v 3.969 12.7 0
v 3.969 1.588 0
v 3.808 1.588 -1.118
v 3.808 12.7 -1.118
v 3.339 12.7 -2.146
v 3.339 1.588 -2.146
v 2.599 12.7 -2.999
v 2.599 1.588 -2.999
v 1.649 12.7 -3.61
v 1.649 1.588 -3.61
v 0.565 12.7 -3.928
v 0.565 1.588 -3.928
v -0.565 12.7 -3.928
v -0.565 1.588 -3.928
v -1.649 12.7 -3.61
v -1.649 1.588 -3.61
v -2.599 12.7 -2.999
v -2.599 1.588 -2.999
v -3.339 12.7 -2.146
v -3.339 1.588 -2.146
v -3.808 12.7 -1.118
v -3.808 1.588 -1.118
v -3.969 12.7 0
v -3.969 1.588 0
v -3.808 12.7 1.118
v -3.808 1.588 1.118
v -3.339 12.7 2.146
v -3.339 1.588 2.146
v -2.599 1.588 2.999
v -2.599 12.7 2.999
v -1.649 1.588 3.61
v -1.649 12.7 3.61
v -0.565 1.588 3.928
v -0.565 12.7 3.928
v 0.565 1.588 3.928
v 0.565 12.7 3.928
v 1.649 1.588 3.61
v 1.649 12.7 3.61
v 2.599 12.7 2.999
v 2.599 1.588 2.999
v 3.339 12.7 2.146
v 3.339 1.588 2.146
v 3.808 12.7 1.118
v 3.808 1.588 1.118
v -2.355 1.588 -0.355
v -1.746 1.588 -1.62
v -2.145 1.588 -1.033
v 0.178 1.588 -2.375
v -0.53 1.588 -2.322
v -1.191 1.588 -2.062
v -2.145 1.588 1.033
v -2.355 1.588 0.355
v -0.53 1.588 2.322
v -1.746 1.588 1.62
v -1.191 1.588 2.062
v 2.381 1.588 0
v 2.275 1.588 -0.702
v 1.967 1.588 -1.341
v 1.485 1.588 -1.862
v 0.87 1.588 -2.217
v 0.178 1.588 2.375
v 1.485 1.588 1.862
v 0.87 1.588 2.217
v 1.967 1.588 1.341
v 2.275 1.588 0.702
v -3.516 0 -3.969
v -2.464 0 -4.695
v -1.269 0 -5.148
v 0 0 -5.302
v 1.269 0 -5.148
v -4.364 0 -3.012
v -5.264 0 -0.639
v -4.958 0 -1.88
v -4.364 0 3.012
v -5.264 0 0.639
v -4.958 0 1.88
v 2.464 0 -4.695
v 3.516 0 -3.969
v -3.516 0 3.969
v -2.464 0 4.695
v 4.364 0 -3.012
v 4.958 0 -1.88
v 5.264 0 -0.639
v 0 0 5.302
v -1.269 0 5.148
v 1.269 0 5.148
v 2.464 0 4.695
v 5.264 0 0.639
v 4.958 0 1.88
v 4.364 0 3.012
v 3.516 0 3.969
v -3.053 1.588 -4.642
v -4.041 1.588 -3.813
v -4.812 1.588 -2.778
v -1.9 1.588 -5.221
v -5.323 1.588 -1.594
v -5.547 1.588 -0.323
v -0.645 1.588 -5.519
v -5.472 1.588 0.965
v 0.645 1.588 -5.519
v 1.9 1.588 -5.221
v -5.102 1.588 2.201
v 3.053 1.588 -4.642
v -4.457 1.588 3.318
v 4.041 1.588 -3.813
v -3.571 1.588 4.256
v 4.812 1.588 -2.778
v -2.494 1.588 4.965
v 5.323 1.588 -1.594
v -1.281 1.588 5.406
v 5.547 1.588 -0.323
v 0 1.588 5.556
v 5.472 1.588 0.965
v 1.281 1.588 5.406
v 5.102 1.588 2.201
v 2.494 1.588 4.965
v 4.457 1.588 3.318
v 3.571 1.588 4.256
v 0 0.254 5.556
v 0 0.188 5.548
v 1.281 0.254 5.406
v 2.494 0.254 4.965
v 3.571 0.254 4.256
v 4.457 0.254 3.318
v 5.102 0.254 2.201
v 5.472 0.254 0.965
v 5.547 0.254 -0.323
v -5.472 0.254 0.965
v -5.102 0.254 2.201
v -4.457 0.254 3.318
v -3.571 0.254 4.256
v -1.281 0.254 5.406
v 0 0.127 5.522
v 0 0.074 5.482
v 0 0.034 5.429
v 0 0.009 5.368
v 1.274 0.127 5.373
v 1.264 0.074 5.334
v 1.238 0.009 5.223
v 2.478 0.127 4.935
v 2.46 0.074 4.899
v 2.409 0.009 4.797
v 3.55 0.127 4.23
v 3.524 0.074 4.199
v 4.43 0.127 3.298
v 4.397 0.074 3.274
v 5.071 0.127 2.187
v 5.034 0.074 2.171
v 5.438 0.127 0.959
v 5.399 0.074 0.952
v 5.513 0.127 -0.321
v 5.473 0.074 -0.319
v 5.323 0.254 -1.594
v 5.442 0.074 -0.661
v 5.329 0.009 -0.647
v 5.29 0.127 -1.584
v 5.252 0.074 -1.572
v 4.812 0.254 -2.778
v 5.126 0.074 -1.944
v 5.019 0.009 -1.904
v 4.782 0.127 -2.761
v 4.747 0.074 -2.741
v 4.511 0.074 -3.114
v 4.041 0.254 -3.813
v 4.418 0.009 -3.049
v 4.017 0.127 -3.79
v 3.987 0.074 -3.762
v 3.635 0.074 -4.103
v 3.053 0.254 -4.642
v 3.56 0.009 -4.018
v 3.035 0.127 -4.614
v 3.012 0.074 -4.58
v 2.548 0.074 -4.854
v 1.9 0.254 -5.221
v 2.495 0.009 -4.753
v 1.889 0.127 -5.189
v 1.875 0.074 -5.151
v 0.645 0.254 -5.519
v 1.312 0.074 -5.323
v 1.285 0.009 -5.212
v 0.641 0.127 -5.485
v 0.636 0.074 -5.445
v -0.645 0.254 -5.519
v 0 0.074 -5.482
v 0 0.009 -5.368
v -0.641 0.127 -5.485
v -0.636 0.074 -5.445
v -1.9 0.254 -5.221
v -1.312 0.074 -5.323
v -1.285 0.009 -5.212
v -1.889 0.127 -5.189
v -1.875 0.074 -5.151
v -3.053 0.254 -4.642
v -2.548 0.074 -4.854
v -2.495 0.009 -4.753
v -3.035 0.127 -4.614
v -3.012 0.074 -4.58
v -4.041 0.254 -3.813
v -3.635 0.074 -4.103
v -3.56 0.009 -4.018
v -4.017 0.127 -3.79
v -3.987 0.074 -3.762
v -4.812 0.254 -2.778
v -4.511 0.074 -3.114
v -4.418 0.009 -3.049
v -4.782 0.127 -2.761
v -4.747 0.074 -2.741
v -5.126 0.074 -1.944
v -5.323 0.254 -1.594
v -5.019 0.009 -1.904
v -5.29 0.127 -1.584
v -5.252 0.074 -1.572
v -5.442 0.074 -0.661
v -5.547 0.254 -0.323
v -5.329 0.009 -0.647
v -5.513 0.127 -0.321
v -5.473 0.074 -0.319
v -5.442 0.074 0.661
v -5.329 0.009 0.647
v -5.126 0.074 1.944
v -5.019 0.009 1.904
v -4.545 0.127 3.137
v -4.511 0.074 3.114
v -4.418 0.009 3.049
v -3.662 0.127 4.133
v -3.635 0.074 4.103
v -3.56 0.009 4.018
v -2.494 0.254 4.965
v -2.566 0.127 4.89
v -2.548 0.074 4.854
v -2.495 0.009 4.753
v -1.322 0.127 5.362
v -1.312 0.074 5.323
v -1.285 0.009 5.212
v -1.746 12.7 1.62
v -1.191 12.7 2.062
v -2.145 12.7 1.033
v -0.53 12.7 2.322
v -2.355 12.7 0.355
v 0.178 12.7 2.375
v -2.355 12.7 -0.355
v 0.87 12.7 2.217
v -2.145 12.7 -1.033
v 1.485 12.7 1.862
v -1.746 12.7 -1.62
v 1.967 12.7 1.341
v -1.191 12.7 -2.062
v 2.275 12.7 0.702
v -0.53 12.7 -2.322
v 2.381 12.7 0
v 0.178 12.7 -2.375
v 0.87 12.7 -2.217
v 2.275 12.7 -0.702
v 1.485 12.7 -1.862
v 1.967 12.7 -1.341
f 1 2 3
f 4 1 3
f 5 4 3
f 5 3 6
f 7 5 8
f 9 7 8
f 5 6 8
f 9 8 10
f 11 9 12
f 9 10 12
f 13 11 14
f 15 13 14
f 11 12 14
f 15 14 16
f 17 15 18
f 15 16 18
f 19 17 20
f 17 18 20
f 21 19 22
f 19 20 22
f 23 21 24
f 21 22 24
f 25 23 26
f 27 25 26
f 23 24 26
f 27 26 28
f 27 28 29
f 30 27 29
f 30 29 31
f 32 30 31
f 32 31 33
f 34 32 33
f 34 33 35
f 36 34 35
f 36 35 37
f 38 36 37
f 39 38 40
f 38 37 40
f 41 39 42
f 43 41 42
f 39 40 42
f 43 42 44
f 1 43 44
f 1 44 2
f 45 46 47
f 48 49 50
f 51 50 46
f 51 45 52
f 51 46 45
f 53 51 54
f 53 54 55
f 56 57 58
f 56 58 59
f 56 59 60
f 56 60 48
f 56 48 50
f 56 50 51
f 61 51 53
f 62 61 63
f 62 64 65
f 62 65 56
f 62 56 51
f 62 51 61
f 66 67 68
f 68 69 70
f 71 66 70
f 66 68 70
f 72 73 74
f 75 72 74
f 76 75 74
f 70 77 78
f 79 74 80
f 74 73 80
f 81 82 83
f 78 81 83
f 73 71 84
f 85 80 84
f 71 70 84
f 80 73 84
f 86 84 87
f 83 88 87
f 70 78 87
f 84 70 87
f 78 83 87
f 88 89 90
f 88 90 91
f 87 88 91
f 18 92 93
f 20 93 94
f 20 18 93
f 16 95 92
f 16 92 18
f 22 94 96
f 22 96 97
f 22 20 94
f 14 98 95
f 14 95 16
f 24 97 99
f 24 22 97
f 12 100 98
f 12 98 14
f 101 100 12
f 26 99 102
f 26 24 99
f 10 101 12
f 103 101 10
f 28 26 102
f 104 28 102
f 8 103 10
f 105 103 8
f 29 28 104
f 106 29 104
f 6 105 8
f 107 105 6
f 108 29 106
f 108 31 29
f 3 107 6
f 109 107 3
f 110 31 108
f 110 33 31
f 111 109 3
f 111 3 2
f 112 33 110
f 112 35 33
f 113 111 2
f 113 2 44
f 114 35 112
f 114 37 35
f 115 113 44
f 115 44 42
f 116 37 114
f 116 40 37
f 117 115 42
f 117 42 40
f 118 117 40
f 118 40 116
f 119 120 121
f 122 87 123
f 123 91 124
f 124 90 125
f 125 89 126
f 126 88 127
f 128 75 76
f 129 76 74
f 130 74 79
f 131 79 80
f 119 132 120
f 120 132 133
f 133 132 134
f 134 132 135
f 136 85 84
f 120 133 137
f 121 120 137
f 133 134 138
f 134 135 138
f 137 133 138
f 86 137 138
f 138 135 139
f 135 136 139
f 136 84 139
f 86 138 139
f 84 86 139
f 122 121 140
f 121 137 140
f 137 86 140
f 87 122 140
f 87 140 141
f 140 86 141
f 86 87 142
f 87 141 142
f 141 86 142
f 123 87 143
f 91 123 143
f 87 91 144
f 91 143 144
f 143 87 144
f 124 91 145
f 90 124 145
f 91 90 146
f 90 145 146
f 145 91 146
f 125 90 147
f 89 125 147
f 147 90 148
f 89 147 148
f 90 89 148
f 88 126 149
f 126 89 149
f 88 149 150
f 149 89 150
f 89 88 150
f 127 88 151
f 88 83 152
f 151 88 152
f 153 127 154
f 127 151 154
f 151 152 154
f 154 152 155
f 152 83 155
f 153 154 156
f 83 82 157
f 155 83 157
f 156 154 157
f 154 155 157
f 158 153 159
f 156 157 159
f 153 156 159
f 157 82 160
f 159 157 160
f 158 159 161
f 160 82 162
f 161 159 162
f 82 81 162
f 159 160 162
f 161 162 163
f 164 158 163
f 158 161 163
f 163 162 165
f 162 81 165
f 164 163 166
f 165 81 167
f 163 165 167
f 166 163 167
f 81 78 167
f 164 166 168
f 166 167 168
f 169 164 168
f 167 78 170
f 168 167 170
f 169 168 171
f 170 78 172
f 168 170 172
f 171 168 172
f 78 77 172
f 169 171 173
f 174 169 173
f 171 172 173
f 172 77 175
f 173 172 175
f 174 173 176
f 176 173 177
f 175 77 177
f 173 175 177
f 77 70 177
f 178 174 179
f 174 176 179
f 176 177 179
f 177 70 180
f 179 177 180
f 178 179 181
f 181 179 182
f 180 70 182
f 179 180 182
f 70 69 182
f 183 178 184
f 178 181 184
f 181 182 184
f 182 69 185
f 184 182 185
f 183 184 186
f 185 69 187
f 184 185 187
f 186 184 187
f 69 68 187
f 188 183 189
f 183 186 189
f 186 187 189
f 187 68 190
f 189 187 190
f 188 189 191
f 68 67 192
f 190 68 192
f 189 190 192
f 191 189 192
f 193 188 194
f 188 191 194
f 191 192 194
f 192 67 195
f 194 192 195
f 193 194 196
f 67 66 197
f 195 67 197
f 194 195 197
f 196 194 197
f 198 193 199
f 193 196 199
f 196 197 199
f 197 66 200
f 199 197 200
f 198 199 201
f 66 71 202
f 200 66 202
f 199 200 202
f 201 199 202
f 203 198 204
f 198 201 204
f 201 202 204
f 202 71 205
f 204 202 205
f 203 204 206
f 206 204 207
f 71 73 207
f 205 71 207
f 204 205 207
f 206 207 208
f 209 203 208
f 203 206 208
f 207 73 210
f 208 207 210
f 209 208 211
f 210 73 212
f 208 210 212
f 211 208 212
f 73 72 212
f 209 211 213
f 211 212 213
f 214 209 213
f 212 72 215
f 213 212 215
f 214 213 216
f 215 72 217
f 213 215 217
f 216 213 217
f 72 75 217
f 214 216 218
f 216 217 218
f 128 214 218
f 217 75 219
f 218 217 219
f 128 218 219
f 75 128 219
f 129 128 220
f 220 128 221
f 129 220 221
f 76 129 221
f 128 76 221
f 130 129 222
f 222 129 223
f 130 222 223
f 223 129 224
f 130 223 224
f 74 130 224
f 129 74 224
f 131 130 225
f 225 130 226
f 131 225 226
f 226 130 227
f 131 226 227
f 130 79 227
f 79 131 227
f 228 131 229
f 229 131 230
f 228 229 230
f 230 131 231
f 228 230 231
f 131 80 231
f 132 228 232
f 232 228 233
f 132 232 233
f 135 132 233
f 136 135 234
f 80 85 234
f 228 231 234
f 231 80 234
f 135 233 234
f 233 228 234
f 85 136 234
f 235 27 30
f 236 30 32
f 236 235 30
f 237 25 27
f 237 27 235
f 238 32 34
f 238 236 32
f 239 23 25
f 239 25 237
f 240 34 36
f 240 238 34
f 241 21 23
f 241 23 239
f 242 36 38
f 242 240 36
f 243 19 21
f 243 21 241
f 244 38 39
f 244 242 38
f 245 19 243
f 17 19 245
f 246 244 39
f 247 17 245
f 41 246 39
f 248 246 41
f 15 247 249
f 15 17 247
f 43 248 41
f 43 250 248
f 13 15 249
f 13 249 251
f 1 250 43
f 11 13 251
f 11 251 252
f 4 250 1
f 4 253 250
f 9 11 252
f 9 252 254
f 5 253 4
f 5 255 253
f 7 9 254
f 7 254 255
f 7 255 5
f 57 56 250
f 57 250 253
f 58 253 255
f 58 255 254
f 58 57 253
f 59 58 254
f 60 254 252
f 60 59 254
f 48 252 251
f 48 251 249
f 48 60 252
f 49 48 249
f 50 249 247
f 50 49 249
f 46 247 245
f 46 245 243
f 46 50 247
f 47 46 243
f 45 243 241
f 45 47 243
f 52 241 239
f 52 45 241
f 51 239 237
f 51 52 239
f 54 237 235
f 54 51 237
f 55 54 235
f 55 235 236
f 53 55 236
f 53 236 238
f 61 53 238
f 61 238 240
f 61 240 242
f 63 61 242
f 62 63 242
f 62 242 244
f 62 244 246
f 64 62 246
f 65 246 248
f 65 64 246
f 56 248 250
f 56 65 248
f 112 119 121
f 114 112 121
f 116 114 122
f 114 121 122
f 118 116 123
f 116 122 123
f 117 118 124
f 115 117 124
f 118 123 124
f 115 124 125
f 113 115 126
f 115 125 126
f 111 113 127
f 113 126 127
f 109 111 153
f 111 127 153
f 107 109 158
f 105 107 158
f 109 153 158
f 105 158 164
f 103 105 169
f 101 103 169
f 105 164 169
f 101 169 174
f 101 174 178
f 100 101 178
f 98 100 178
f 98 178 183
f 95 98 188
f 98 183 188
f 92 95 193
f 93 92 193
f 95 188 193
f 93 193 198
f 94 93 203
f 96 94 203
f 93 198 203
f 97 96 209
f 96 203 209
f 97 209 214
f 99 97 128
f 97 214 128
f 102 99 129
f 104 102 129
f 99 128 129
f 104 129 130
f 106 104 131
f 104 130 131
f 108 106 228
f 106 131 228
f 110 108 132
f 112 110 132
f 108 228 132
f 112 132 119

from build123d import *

# Parameters (mm, degrees)
SKETCH1_R           = 5.55625
BOSS_EXTRUDE1_DEPTH = 1.5875
SKETCH2_R           = 3.96875
SKETCH2_R_2         = 2.38125
EXTRUDE_THIN1_DEPTH = 11.1125
FILLET1_R           = 0.254


with BuildPart() as part:
    # Sketch1 → Boss-Extrude1 (new body)
    with BuildSketch(Plane(origin=(0, 0, 0), x_dir=(1, 0, 0), z_dir=(0, 1, 0))):
        Circle(SKETCH1_R)
    extrude(amount=BOSS_EXTRUDE1_DEPTH)

    # Sketch2 → Extrude-Thin1 (add)
    with BuildSketch(Plane(origin=(0, 1.5875, 0), x_dir=(1, 0, 0), z_dir=(0, 1, 0))):
        Circle(SKETCH2_R)
        Circle(SKETCH2_R_2, mode=Mode.SUBTRACT)
    extrude(amount=EXTRUDE_THIN1_DEPTH)

    # Fillet1
    fillet1_edges = [part.edges().sort_by_distance(p)[0] for p in [
        (-5.55625, 0, 0),
    ]]
    fillet(fillet1_edges, radius=FILLET1_R)


solid = part.part
